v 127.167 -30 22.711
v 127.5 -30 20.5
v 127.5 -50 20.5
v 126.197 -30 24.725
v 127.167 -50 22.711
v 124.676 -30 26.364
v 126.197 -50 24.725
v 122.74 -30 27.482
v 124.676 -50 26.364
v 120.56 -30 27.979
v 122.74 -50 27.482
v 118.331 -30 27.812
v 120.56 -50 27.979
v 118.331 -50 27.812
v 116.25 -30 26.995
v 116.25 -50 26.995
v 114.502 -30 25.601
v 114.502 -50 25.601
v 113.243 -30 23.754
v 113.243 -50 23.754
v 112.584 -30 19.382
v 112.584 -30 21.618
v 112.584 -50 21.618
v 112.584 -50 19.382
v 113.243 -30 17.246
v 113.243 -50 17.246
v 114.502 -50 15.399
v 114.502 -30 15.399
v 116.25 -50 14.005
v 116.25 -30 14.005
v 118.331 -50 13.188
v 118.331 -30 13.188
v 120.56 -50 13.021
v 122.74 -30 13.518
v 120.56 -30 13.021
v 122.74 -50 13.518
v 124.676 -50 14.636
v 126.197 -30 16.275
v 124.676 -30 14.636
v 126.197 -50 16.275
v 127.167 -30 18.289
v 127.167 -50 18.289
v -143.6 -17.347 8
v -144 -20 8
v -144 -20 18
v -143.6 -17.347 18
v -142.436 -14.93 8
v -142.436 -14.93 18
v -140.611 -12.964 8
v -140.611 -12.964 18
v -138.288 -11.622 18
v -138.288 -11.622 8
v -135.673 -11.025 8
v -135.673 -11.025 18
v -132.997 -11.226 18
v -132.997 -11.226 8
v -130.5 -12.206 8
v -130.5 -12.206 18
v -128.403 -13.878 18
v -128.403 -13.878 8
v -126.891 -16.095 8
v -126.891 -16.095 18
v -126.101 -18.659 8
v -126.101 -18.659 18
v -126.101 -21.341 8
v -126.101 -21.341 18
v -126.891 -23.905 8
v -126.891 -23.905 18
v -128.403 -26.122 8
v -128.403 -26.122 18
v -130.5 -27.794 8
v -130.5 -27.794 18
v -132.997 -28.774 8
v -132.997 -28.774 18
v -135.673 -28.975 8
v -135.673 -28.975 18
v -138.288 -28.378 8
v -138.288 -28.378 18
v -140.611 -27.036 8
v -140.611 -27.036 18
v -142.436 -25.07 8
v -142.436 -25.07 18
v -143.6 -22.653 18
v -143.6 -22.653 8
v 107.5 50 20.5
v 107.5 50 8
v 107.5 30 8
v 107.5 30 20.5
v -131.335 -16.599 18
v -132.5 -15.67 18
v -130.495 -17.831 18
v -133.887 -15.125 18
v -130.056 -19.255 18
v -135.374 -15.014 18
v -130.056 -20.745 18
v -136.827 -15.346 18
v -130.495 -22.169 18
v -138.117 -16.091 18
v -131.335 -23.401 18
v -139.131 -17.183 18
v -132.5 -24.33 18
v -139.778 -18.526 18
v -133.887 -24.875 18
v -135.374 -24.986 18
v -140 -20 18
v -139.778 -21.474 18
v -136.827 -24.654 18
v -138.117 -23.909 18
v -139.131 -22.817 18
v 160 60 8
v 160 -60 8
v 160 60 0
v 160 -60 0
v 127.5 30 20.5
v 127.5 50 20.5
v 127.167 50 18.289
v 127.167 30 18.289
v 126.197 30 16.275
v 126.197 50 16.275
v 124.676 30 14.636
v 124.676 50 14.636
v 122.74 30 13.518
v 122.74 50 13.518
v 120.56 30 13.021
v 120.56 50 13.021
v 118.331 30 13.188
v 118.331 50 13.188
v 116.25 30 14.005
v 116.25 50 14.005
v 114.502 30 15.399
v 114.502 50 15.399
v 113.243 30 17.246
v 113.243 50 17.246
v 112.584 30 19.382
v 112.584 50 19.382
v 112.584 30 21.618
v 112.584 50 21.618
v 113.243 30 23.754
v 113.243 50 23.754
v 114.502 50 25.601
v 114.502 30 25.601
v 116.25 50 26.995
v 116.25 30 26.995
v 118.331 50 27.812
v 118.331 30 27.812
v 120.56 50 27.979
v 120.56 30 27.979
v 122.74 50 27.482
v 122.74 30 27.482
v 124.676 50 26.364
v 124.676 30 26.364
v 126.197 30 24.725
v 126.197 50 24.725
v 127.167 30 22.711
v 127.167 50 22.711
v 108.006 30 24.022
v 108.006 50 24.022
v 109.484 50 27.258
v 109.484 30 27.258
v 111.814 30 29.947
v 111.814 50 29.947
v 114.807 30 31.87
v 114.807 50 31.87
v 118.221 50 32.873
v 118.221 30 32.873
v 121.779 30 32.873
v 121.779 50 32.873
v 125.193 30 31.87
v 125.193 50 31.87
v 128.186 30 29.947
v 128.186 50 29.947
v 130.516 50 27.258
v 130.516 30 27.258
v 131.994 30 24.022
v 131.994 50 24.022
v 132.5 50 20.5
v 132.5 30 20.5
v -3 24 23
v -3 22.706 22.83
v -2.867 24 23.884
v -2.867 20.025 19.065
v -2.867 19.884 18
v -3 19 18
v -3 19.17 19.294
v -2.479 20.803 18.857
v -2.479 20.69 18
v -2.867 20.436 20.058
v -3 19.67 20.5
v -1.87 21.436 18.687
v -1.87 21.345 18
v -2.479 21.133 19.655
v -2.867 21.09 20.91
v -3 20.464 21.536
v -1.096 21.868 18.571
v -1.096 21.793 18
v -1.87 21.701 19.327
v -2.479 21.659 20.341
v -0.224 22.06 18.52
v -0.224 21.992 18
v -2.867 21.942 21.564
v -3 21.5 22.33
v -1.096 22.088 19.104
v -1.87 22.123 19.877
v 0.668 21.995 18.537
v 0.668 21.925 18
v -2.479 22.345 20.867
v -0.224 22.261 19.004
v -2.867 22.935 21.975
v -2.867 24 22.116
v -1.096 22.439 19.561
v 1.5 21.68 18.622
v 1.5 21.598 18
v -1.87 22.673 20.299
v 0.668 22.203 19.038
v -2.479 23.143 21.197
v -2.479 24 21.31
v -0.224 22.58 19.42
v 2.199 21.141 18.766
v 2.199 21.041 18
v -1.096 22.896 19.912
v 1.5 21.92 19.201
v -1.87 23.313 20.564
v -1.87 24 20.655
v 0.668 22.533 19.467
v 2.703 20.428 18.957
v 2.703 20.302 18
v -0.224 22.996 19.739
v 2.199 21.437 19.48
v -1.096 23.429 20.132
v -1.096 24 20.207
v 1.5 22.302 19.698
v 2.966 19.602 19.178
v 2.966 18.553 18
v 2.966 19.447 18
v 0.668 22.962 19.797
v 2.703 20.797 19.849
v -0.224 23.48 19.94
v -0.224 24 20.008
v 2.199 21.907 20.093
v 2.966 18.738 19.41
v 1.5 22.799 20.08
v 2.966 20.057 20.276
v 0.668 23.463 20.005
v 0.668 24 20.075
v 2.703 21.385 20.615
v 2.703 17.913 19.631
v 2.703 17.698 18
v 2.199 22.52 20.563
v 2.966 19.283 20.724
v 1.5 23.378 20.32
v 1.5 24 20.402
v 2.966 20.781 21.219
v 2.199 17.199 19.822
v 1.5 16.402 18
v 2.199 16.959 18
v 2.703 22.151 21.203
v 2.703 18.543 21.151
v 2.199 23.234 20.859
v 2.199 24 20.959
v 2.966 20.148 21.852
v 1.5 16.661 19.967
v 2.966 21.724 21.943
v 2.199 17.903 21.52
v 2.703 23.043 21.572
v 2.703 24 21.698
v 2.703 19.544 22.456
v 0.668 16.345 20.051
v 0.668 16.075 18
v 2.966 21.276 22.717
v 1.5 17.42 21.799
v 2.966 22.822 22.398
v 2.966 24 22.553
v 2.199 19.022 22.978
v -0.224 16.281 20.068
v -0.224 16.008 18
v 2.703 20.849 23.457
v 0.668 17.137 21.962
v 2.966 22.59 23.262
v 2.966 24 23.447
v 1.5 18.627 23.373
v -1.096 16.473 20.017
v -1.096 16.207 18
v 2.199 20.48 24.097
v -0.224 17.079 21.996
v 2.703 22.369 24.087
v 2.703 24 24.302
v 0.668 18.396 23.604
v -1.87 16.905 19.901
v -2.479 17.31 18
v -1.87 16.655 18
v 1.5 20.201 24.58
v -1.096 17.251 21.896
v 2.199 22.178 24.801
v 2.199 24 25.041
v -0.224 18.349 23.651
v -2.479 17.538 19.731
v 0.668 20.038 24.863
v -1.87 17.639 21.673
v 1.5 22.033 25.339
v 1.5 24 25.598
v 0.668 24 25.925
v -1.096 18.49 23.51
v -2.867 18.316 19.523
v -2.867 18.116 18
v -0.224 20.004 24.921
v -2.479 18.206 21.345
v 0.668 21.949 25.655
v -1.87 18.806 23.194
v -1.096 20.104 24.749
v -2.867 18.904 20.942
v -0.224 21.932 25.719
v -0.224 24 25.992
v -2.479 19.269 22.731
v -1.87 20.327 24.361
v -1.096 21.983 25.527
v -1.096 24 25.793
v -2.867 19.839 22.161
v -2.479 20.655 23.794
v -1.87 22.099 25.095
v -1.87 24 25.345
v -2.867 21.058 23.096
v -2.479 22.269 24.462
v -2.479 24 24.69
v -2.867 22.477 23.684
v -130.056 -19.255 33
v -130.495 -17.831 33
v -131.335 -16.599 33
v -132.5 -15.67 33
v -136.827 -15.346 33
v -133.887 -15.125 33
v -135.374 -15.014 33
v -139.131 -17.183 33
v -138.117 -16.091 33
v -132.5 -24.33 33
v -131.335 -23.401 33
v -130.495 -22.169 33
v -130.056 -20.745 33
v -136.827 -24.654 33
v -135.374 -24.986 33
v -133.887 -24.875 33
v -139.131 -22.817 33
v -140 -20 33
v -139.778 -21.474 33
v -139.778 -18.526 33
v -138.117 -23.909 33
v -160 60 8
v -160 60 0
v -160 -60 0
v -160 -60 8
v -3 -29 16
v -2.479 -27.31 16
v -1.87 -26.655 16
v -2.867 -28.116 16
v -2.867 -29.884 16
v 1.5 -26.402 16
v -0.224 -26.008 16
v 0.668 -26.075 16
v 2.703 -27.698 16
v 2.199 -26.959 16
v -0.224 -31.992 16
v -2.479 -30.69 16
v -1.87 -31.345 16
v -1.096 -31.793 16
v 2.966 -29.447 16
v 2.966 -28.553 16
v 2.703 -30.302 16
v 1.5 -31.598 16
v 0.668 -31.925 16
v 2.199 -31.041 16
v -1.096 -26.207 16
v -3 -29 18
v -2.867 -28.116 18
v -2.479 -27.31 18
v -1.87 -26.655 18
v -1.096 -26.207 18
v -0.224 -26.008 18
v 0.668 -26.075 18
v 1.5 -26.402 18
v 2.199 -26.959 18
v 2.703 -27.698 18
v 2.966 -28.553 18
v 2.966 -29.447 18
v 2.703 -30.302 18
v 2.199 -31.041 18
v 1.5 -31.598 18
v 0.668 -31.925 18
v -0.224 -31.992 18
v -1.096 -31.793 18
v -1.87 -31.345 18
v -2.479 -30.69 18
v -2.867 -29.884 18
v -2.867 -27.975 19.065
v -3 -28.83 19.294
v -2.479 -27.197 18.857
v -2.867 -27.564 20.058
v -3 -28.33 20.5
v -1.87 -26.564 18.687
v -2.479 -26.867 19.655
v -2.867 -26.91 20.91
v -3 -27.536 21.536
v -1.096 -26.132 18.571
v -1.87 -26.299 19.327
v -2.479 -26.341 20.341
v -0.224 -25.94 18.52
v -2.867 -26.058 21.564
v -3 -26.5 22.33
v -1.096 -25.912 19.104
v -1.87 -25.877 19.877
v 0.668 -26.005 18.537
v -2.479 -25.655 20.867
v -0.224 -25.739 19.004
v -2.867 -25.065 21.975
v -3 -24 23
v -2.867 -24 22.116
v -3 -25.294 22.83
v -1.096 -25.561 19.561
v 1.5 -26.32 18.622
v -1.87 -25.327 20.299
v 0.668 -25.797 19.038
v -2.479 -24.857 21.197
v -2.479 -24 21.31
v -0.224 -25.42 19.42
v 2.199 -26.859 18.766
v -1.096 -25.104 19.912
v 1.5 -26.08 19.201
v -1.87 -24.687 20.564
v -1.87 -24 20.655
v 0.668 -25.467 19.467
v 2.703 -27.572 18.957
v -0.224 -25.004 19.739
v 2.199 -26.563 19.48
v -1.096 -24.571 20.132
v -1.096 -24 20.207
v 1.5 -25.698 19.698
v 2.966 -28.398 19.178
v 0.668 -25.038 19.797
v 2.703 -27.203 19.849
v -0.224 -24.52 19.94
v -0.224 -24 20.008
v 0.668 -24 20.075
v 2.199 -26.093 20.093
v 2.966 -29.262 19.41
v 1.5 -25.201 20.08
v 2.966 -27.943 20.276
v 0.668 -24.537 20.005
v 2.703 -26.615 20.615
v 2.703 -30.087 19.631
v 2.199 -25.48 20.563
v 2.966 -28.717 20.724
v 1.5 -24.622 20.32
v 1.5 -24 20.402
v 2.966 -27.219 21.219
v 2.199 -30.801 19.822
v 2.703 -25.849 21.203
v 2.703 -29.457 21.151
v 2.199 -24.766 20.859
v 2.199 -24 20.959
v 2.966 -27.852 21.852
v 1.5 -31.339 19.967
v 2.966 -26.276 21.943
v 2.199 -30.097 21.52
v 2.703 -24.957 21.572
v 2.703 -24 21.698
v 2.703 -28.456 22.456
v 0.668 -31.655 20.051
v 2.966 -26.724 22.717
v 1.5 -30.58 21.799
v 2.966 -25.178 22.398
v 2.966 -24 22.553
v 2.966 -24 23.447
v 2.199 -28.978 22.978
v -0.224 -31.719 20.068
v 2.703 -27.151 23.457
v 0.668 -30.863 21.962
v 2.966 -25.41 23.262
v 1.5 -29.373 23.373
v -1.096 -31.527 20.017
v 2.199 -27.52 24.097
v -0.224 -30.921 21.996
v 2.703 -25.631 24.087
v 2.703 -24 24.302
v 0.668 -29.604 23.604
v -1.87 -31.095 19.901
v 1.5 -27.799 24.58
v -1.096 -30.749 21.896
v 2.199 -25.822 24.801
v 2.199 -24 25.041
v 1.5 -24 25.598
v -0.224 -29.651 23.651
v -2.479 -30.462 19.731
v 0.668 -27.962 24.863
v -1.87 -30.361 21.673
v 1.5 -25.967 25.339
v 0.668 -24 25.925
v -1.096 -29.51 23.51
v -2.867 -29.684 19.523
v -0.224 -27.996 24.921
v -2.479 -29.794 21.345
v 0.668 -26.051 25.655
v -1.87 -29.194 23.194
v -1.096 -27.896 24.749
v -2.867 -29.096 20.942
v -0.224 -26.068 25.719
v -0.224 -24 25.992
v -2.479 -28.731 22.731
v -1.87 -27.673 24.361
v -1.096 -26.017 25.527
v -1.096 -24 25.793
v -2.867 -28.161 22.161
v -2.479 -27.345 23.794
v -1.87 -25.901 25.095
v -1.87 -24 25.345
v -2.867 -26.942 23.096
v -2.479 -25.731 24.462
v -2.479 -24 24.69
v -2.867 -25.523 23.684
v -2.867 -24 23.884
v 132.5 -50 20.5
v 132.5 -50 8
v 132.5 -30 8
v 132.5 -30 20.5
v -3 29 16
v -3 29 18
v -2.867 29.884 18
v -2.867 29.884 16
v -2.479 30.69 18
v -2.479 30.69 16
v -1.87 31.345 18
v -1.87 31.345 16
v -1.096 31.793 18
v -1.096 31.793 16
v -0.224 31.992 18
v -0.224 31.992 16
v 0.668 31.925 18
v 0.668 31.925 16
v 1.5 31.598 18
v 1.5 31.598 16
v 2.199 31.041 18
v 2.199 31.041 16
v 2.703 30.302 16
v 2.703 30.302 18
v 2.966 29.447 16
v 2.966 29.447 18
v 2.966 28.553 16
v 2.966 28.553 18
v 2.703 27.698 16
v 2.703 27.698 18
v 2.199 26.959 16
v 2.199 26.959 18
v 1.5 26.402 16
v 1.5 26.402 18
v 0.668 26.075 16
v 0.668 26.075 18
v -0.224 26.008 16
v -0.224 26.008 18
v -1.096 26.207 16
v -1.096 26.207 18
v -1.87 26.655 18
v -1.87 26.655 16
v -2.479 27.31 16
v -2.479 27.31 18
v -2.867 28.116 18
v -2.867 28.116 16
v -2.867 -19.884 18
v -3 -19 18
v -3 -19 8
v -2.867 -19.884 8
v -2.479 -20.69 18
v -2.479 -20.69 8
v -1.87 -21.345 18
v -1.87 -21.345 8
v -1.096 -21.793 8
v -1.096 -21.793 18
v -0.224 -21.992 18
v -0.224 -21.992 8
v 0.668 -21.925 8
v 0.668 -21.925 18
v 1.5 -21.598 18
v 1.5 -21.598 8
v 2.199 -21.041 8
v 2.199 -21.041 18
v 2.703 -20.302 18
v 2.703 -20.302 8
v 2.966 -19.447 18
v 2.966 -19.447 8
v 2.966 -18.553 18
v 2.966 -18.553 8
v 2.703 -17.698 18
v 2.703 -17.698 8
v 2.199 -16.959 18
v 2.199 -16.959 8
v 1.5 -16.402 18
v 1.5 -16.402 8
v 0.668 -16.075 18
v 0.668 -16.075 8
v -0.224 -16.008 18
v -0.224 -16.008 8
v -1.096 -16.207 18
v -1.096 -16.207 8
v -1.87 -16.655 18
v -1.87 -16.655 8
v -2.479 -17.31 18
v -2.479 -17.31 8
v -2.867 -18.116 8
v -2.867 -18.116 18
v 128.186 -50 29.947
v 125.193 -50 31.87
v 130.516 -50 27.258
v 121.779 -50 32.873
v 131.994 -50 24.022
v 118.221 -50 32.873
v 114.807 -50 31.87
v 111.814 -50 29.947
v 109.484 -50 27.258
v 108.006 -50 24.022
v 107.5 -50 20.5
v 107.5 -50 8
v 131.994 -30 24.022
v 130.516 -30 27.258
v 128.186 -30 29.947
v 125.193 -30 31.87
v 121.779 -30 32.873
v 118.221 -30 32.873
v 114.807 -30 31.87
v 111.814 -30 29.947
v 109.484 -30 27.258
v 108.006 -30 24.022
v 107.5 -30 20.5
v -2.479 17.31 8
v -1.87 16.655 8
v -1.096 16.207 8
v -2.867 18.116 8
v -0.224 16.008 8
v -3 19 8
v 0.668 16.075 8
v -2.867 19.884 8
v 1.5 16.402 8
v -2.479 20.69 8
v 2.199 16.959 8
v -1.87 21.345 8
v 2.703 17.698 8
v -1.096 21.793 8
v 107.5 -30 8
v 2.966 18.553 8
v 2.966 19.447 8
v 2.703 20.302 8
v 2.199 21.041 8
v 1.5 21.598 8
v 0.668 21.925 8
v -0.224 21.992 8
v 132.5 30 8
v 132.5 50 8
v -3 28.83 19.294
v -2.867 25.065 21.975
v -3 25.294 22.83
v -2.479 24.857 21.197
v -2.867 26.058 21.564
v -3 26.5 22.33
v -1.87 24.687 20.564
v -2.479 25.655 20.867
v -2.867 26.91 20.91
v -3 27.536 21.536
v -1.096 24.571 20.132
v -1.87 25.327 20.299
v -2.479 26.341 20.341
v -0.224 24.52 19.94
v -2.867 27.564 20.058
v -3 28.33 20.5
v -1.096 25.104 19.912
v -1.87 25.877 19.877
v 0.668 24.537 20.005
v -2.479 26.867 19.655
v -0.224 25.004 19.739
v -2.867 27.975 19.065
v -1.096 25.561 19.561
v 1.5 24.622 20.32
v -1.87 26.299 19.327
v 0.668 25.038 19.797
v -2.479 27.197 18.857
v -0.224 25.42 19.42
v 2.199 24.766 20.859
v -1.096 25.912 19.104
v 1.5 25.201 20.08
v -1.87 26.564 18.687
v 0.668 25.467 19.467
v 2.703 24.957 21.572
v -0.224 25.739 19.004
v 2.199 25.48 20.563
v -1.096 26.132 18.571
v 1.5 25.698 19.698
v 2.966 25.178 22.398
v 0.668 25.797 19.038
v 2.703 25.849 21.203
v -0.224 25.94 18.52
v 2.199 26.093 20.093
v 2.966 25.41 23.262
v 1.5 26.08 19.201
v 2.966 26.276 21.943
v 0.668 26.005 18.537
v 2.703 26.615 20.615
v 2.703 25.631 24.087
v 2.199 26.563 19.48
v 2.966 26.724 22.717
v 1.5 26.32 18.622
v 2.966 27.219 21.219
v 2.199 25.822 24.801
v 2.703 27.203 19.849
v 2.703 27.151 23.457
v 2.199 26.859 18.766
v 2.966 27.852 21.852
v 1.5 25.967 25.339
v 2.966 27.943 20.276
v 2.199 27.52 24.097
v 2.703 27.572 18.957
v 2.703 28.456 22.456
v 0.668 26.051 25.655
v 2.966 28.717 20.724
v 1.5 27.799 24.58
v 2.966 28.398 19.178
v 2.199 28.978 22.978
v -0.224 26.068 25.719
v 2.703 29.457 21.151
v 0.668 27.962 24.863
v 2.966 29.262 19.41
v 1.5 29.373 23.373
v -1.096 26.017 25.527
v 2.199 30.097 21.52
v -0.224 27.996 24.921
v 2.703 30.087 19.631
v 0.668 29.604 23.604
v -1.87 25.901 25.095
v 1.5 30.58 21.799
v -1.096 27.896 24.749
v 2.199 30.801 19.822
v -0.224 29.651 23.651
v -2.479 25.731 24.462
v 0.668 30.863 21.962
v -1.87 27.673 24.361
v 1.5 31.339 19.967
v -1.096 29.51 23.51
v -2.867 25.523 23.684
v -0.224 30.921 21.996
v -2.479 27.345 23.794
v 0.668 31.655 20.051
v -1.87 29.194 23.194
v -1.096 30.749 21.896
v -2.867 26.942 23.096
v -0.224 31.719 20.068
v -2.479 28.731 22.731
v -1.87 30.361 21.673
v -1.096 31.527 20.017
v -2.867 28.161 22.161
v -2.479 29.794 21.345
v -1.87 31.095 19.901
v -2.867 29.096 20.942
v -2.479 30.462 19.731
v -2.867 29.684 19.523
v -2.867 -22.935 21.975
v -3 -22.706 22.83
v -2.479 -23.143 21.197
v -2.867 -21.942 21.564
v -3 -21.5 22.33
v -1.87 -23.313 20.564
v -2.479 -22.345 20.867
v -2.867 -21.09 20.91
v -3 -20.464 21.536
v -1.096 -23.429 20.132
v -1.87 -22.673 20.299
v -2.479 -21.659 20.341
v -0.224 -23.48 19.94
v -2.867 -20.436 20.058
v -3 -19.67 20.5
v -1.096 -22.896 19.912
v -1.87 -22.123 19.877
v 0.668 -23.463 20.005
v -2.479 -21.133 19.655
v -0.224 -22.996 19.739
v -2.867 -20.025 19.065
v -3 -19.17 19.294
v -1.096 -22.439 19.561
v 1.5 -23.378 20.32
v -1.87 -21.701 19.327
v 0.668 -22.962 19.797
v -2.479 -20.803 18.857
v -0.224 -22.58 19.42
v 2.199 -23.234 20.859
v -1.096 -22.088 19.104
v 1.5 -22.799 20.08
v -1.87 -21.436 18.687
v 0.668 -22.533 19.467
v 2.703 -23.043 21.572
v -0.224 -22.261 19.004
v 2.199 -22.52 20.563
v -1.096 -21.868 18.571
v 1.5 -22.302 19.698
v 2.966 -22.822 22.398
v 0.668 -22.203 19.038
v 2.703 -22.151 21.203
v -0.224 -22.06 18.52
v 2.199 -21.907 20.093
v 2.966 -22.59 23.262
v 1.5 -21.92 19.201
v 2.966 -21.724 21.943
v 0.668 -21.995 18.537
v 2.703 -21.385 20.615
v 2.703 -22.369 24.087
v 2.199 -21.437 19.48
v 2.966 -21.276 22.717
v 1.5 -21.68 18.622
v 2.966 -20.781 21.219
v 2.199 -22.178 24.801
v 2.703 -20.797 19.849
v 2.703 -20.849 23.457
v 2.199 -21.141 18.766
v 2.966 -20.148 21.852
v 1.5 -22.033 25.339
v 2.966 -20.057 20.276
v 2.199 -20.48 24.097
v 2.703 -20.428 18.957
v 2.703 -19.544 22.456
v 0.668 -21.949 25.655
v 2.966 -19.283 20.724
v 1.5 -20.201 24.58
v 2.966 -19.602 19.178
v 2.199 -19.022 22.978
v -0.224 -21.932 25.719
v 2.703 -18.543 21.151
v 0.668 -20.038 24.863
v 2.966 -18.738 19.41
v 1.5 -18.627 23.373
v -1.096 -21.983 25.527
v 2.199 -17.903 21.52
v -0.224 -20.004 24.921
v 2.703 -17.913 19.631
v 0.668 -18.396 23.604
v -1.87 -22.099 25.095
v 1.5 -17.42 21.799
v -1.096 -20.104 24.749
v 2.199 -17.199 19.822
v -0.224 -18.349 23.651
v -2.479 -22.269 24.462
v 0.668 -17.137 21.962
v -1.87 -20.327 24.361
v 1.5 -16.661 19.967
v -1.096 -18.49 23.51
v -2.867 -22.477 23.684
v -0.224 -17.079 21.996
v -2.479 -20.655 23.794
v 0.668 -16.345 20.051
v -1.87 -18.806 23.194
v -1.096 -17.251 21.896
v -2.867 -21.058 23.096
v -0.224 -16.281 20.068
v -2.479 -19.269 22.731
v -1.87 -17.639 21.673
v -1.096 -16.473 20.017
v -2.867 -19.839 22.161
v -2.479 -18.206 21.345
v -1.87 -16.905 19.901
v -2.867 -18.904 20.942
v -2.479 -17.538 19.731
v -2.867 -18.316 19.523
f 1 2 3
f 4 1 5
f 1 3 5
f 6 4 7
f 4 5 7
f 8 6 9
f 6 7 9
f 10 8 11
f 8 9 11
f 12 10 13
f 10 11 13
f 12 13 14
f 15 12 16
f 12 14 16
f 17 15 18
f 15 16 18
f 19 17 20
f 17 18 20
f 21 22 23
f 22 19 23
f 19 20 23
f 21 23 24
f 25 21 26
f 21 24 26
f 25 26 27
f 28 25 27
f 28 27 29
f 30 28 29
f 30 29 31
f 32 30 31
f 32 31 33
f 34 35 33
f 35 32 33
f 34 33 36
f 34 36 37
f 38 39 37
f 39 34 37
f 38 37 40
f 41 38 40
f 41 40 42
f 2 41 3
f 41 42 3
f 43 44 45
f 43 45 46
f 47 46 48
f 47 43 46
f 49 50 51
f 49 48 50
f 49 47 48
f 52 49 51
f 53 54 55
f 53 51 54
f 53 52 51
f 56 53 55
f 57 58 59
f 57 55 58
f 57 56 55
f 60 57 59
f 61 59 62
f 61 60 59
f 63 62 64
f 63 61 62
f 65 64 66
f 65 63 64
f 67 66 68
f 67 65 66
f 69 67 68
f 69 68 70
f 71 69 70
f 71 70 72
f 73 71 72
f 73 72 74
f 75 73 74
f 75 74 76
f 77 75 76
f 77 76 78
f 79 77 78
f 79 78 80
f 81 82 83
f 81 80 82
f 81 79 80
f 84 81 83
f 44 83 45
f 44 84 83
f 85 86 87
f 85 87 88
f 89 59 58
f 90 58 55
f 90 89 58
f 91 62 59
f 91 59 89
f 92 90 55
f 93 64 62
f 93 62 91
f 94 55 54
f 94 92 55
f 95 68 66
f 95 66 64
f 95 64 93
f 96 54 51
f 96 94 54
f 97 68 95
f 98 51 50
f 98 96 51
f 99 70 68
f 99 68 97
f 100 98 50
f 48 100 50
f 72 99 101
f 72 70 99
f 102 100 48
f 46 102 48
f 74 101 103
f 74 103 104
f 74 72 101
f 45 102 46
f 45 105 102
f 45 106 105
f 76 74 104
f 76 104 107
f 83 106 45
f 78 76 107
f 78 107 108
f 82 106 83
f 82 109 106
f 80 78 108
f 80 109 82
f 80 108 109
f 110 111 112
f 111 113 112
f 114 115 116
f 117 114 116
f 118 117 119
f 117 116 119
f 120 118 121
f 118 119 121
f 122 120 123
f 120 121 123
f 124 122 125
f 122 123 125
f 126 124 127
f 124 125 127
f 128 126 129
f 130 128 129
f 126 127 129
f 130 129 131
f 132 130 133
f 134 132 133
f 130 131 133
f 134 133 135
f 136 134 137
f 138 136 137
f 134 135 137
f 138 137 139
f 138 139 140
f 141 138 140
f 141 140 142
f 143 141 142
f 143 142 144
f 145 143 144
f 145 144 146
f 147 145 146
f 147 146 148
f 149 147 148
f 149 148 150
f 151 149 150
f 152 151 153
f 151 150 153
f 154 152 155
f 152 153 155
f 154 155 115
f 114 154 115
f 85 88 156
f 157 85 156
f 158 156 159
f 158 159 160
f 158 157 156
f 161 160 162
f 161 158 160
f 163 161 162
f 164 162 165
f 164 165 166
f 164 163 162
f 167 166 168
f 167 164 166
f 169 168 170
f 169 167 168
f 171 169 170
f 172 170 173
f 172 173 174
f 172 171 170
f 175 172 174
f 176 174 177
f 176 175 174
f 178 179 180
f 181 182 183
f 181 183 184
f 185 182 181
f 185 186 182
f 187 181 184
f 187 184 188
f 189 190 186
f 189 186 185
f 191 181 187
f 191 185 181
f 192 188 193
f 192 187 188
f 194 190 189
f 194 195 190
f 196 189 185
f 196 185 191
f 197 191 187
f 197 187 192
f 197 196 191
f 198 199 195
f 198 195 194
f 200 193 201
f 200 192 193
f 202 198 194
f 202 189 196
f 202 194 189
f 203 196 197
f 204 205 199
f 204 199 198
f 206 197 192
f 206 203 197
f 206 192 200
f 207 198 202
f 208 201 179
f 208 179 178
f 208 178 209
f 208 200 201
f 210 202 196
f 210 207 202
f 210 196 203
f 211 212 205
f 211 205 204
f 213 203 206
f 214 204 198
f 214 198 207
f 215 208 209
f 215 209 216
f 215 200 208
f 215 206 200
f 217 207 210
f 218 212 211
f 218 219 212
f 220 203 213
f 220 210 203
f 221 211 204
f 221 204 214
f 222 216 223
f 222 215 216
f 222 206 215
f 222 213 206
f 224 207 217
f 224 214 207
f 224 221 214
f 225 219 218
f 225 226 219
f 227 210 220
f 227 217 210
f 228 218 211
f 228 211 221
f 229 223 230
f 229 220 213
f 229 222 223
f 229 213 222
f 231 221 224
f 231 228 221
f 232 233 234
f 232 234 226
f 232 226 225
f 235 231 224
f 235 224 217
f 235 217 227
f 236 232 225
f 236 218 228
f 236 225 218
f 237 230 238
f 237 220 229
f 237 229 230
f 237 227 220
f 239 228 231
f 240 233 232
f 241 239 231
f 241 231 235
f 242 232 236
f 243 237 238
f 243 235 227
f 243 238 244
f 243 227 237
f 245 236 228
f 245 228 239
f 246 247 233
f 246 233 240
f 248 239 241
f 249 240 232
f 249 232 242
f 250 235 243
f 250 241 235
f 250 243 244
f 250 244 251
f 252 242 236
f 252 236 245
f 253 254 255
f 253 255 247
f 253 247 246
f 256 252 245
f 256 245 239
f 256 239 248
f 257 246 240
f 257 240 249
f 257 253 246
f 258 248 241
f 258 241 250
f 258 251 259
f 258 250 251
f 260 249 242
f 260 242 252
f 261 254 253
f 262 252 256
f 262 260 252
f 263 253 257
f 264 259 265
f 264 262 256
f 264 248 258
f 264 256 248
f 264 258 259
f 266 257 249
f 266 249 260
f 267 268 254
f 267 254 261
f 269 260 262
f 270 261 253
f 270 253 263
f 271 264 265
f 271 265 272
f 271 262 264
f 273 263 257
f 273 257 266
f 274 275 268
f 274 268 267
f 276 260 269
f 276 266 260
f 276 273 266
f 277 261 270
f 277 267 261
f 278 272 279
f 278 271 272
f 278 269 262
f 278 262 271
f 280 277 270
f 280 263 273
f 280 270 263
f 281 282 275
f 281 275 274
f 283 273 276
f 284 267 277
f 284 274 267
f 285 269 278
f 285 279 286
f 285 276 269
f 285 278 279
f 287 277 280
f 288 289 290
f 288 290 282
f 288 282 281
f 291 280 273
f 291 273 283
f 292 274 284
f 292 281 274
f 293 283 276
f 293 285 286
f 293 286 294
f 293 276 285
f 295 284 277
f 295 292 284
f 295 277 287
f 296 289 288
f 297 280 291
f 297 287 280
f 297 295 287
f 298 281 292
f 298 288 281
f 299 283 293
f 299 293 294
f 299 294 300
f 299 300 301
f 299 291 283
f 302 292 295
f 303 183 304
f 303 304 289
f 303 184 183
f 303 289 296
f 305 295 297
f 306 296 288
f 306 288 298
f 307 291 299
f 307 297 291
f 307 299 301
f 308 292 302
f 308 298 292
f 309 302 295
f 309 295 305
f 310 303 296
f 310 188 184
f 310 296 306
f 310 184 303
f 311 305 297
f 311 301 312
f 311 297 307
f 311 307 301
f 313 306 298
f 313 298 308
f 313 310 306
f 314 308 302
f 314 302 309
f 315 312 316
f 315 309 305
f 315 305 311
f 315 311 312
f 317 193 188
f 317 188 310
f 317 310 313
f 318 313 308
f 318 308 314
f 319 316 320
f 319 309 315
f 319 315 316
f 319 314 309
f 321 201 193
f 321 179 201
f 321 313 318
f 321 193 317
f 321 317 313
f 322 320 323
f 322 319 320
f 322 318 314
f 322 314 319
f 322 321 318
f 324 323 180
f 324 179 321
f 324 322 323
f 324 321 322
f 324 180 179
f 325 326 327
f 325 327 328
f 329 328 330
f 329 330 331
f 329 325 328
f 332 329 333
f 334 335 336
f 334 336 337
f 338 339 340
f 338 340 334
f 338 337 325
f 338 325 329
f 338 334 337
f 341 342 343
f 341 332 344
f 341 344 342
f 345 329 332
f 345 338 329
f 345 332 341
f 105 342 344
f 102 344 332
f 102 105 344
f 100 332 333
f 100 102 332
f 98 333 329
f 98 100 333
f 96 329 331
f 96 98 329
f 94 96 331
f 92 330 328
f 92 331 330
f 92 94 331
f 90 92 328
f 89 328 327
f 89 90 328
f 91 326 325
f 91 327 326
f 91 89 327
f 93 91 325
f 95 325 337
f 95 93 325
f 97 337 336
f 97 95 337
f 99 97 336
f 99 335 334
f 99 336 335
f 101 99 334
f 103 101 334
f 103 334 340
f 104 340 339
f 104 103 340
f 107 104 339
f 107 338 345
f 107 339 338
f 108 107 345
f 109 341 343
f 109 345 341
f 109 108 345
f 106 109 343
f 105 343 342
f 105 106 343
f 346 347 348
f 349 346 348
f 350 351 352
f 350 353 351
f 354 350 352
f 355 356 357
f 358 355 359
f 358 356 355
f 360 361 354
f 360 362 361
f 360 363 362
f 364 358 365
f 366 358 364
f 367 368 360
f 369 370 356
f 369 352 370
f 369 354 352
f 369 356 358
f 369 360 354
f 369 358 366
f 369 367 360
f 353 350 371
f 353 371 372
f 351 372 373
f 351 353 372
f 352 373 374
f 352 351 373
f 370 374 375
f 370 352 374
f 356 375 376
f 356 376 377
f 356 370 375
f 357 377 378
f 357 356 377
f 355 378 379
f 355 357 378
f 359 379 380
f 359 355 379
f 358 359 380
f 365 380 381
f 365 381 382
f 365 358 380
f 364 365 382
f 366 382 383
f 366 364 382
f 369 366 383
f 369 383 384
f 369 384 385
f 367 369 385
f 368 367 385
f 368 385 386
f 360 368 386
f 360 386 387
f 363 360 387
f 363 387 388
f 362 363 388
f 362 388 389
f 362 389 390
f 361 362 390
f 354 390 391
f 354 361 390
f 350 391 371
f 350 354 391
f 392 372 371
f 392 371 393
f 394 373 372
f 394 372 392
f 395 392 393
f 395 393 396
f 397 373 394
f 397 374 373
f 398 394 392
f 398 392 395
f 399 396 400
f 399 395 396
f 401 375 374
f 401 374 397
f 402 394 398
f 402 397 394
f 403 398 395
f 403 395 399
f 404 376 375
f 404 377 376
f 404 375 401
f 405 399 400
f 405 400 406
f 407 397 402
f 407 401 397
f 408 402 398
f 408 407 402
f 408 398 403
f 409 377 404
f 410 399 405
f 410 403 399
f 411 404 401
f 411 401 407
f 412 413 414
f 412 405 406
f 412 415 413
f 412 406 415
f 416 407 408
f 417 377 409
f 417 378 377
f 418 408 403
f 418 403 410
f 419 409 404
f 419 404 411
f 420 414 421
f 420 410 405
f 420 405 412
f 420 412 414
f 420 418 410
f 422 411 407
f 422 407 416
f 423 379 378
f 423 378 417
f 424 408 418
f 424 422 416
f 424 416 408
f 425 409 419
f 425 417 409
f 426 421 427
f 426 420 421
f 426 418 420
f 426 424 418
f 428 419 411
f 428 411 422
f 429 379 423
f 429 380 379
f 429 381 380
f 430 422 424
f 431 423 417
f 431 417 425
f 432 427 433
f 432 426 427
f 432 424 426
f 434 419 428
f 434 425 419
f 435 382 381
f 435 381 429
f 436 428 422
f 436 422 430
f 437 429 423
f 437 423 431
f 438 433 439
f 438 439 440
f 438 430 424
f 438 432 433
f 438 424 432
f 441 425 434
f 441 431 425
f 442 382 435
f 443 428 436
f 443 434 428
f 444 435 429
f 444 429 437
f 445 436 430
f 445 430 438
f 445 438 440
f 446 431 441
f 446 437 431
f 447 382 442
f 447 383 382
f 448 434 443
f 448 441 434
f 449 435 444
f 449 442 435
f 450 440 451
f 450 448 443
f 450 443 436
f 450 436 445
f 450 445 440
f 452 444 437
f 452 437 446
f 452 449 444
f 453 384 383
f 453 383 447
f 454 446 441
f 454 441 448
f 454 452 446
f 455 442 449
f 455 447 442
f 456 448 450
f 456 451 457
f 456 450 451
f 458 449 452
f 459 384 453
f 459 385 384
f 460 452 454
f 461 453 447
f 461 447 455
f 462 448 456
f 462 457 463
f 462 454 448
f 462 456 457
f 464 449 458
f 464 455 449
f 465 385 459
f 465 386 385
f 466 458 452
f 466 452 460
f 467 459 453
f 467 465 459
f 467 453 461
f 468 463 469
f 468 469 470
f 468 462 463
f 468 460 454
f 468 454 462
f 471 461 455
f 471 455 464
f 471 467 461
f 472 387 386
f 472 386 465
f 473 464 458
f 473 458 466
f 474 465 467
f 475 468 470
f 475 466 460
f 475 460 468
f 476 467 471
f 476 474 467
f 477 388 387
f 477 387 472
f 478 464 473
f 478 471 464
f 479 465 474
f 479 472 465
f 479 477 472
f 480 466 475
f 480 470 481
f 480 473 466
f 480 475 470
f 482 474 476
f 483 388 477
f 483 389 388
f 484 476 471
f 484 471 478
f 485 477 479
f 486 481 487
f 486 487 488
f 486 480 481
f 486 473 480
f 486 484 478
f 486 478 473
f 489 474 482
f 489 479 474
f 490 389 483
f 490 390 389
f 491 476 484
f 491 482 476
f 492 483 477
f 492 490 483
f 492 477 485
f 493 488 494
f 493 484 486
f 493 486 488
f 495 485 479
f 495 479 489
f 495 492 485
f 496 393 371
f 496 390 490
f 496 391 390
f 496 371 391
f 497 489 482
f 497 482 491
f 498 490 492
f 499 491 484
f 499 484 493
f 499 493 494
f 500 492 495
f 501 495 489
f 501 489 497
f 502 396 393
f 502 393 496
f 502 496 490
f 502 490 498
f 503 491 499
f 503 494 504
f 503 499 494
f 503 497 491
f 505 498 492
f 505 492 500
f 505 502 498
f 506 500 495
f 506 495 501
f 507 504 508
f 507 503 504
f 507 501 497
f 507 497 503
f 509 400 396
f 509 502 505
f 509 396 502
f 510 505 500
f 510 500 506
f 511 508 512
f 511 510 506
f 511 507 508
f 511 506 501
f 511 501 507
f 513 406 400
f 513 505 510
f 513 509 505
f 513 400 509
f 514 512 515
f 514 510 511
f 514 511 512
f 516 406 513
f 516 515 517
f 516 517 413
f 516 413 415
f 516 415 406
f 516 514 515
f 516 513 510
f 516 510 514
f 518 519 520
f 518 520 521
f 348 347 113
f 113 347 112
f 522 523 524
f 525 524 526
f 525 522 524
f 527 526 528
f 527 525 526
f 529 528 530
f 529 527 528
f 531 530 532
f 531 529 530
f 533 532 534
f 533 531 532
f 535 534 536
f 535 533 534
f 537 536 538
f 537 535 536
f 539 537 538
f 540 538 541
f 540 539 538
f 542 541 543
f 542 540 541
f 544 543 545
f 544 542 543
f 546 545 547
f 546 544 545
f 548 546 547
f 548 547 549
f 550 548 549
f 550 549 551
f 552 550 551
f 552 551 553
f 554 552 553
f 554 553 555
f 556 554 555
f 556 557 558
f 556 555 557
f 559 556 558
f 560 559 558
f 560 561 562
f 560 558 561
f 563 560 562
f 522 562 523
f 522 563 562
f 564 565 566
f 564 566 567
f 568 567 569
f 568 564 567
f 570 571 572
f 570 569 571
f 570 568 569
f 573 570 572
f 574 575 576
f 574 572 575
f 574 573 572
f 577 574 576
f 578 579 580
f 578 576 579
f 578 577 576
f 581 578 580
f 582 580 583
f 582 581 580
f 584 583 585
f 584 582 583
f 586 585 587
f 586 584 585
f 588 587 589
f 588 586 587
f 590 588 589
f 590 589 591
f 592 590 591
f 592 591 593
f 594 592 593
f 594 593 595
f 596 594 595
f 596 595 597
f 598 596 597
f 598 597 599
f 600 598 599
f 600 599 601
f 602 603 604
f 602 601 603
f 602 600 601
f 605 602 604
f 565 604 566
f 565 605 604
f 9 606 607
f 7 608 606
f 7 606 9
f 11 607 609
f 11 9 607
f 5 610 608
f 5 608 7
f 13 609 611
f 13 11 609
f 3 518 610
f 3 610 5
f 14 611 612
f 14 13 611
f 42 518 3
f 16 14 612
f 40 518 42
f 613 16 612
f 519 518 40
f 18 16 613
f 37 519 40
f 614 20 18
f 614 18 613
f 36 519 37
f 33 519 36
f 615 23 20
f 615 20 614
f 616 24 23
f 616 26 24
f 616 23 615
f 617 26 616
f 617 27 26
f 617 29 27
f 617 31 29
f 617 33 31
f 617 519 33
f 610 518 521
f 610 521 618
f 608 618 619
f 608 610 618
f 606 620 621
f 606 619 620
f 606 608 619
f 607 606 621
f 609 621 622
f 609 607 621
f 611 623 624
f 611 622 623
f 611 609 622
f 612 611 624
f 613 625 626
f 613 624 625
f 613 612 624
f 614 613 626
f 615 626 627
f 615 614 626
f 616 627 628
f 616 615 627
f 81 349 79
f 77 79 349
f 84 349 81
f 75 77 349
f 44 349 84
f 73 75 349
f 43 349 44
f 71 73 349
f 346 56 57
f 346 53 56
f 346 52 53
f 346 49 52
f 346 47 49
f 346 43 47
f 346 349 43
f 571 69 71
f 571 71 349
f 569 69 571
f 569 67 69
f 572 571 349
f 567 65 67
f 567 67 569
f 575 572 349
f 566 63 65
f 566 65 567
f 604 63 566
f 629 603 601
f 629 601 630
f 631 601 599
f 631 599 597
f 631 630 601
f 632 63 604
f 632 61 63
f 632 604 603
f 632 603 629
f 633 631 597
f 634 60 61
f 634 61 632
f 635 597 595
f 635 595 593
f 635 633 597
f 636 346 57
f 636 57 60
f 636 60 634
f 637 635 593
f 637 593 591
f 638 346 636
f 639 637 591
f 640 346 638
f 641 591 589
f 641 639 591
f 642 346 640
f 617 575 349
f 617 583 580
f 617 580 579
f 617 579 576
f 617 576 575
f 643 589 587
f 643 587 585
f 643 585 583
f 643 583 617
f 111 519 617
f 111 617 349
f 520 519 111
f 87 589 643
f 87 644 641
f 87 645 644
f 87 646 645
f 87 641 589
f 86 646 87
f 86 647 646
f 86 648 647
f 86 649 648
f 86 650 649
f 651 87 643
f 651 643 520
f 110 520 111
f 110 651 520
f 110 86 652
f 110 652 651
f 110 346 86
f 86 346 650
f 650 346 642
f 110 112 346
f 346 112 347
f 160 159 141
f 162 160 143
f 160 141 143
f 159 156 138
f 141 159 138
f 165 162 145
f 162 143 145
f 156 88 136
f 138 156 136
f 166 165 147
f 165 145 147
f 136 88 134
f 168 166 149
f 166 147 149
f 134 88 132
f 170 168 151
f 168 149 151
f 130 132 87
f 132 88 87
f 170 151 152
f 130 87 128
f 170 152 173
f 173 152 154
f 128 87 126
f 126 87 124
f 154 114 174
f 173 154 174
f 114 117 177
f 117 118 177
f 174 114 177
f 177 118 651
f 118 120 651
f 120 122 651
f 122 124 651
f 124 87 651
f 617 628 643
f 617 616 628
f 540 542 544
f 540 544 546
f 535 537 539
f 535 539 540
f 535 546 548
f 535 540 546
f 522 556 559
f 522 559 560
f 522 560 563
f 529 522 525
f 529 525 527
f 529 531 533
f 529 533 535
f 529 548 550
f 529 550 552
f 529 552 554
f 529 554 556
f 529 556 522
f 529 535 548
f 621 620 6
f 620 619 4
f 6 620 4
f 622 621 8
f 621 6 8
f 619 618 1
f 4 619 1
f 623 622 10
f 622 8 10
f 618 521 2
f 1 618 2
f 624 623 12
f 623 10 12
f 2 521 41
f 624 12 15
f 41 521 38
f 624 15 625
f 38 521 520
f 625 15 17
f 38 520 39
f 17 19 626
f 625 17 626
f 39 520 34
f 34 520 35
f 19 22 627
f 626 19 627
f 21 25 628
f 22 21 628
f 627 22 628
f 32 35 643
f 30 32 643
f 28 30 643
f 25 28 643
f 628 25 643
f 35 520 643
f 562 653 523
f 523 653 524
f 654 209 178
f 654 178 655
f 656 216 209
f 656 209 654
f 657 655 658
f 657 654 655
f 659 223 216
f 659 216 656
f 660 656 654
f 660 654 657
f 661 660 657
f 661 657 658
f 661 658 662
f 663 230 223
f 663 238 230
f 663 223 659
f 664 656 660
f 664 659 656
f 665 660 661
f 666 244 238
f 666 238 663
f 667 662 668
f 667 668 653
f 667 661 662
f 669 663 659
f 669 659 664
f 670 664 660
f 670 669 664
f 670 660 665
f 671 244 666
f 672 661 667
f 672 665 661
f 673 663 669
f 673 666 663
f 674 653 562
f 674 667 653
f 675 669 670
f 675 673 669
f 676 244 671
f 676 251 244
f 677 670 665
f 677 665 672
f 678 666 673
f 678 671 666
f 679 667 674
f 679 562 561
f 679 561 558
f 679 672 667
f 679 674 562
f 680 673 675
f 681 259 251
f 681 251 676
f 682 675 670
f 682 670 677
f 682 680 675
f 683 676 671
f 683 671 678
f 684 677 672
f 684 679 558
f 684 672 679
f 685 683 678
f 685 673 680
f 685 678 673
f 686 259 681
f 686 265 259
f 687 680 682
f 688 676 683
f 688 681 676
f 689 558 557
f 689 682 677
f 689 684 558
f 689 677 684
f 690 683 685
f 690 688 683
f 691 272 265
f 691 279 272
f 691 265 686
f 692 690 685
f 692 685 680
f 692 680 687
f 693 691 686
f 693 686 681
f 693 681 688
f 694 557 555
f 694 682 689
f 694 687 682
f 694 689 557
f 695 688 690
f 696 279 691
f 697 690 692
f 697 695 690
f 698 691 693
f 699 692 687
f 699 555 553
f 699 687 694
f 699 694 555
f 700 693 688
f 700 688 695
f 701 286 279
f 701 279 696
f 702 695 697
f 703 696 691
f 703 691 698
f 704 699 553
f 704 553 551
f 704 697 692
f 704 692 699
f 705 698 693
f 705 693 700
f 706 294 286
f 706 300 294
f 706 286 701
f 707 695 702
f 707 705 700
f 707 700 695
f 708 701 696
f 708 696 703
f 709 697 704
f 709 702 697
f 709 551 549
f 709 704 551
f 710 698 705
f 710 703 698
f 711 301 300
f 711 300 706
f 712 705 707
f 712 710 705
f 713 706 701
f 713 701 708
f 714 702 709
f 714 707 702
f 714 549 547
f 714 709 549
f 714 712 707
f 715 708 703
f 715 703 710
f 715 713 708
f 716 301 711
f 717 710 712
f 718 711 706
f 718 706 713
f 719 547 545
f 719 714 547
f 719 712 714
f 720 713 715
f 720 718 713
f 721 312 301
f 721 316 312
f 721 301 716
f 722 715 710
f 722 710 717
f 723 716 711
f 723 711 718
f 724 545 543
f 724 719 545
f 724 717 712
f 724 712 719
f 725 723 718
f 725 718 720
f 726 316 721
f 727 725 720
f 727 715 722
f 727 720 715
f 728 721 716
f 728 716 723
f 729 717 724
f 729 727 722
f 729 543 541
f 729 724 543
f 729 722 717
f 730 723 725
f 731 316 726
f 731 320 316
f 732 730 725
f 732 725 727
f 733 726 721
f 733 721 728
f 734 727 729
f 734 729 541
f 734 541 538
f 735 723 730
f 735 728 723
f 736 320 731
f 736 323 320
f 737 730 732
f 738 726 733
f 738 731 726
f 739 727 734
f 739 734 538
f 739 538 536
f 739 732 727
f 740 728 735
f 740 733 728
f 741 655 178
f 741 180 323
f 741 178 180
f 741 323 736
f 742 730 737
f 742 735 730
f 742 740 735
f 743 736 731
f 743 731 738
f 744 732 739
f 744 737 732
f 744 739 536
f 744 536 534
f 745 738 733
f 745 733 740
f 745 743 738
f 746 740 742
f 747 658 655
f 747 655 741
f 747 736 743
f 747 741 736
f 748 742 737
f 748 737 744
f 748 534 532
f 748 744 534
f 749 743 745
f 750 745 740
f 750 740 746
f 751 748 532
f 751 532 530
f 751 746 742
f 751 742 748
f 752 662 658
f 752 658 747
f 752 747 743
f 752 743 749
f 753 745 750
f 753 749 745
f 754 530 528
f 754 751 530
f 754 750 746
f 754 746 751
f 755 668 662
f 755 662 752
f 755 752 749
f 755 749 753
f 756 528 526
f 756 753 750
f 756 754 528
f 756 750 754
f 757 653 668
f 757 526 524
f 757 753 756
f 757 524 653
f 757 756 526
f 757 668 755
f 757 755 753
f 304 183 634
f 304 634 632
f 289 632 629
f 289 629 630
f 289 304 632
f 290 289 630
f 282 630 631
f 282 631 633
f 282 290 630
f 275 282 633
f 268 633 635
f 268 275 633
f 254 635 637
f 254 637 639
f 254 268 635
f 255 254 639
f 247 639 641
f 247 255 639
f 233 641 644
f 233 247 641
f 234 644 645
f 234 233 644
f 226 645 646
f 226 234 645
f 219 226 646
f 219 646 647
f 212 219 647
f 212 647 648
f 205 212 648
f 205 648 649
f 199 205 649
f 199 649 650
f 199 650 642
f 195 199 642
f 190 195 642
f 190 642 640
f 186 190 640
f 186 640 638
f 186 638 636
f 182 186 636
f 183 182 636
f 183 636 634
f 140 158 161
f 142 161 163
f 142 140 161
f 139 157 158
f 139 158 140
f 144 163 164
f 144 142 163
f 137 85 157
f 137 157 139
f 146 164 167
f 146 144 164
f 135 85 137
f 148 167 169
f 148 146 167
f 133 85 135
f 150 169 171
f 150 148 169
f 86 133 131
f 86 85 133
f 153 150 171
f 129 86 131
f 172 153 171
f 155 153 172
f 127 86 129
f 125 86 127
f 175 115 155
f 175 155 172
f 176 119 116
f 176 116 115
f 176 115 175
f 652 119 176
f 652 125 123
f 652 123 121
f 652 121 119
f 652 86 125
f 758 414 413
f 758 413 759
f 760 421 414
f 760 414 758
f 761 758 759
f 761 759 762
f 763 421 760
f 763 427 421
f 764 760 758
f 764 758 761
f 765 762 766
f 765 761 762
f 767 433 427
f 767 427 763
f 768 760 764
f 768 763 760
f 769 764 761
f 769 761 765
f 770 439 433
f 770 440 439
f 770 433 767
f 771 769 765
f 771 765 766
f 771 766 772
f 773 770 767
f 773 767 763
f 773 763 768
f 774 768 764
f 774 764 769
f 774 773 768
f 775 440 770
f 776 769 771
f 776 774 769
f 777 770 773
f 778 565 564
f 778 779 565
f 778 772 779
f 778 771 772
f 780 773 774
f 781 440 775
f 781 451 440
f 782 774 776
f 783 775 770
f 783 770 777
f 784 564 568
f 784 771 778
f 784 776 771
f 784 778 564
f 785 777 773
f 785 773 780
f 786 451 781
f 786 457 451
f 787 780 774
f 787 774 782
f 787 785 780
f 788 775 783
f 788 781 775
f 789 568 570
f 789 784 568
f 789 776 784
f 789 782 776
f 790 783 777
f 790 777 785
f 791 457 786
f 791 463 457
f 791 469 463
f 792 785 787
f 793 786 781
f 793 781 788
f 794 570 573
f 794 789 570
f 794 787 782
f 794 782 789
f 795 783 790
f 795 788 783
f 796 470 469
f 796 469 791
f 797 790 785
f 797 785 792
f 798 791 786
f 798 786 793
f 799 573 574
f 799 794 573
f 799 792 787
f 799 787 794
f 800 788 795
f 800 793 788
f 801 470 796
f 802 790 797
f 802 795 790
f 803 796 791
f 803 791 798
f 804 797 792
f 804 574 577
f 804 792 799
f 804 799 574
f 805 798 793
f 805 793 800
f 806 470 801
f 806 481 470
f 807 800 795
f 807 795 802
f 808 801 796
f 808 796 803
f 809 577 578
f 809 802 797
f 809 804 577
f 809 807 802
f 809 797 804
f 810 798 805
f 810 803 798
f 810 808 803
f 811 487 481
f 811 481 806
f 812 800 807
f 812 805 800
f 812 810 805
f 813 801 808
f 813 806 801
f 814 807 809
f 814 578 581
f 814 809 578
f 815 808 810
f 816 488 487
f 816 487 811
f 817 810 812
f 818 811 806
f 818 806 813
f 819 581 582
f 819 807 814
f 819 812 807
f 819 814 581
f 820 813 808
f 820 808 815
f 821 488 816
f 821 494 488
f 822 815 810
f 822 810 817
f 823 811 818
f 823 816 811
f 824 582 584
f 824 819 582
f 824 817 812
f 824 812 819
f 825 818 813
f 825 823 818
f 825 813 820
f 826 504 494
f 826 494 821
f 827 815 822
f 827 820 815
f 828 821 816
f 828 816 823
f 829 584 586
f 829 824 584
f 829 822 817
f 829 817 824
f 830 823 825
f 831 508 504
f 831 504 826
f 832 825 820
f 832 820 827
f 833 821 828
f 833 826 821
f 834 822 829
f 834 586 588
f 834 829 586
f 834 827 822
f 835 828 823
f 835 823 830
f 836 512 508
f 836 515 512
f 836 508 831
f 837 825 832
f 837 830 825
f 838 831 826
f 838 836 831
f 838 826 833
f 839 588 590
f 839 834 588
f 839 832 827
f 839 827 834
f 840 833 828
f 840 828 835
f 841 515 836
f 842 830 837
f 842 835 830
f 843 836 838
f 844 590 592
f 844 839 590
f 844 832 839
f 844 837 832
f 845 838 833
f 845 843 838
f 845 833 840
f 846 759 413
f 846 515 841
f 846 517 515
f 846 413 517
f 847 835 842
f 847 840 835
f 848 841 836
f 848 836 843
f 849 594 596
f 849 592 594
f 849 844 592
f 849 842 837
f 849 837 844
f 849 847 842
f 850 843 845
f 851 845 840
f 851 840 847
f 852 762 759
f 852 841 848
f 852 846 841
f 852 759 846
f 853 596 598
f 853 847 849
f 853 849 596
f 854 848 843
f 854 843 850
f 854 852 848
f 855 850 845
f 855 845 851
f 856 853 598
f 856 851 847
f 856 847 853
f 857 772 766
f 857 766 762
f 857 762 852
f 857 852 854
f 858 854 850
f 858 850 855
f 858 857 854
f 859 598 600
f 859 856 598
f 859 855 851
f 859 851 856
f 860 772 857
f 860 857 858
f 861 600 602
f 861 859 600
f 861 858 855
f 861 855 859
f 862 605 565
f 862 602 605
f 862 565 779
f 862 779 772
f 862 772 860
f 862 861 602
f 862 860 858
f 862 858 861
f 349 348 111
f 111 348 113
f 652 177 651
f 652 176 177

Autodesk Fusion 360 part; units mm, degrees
sketch "Szkic1" plane through (0, 0, 0) normal (0, 0, 1) x (1, 0, 0)
  line L0 (160, 60) -> (-160, 60)
  line L1 (-160, 60) -> (-160, -60)
  line L2 (-160, -60) -> (160, -60)
  line L3 (160, -60) -> (160, 60)
  line L4 (160, 60) -> (-160, -60) construction
  line L5 (-160, 60) -> (160, -60) construction
  dimension "d1" = 120
  dimension "d2" = 320
extrude "Wyciągnięcie proste1" add sketch "Szkic1" along normal blind 8
sketch "Szkic2" plane through (0, 0, 0) normal (0, 1, 0) x (1, 0, 0)
  line L0 (107.5, -8) -> (107.5, -20.5)
  line L1 (107.5, -20.5) -> (132.5, -20.5)
  line L2 (132.5, -20.5) -> (132.5, -8)
  circle A0 centre (120, -20.5) radius 12.5
  line L3 (107.5, -8) -> (132.5, -8)
  line L4 (-160, -8) -> (160, -8)
  circle A1 centre (120, -20.5) radius 7.5
  dimension "d5" = 15
  dimension "d6" = 25
  dimension "d7" = 40
extrude "Wyciągnięcie proste2" add sketch "Szkic2" against normal blind 20 from surface at 50 contours L0 A0 L3 L4 | L1 A0 A1 | L1 A0 A1 | L2 A0 L3 L4
sketch "Szkic4" plane through (0, 0, 0) normal (1, 0, 0) x (0, 1, 0)
  line L0 (19, 8) -> (19, 18)
  arc A0 (24, 23) -> (19, 18) centre (24, 18) ccw
  line L1 (29, 18) -> (29, 16)
  arc A1 (29, 18) -> (24, 23) centre (24, 18) ccw
  point P0 (19, 23)
  point P1 (29, 23)
  dimension "d11" = 15
  dimension "d12" = 10
  dimension "d13" = 5
  dimension "d23" = 7
  dimension "d24" = 5
ref_plane "Płaszczyzna konstrukcyjna1" through (0, 29, 0) normal (0, 1, 0) x (0, 0, 1)
sketch "Szkic6" plane through (0, 0, 8) normal (0, 0, 1) x (-1, 0, 0)
  circle A0 centre (0, -19) radius 3
  circle A1 centre (0, -19) radius 5
  line L0 (-132.5, -50) -> (-132.5, -30)
  line L1 (-132.5, -30) -> (-107.5, -30)
  line L2 (-107.5, -30) -> (-107.5, -50)
  line L3 (-107.5, -50) -> (-132.5, -50)
  line L4 (-160, 60) -> (-160, -60)
  line L5 (-160, -60) -> (160, -60)
  line L6 (160, -60) -> (160, 60)
  line L7 (160, 60) -> (-160, 60)
  point P0 (0, -19)
  dimension "d14" = 10
  dimension "d15" = 6
sweep "Przeciągnięcie2" add profiles "Szkic6" path "Szkic4" along L1 A1 A0 L0 section 1 contours A0
mirror "Odbij1" about plane through (0, 0, 0) normal (0, 1, 0) of "Wyciągnięcie proste2", "Przeciągnięcie2"
sketch "Szkic7" plane through (0, 0, 8) normal (0, 0, 1) x (-1, 0, 0)
sketch "Szkic8" plane through (0, 0, 8) normal (0, 0, 1) x (-1, 0, 0)
  circle A0 centre (135, 20) radius 5
  line L0 (160, -60) -> (160, 60)
  line L1 (-160, -60) -> (160, -60)
  line L2 (0, 0) -> (60, 0)
  circle A1 centre (135, 20) radius 9
  dimension "d33" = 10
  dimension "d34" = 25
  dimension "d38" = 80
  dimension "d39" = 18
extrude "Wyciągnięcie proste3" add sketch "Szkic8" along normal blind 10 contours A0 | A1
extrude "Wyciągnięcie proste4" add sketch "Szkic8" along normal blind 25 contours A0
